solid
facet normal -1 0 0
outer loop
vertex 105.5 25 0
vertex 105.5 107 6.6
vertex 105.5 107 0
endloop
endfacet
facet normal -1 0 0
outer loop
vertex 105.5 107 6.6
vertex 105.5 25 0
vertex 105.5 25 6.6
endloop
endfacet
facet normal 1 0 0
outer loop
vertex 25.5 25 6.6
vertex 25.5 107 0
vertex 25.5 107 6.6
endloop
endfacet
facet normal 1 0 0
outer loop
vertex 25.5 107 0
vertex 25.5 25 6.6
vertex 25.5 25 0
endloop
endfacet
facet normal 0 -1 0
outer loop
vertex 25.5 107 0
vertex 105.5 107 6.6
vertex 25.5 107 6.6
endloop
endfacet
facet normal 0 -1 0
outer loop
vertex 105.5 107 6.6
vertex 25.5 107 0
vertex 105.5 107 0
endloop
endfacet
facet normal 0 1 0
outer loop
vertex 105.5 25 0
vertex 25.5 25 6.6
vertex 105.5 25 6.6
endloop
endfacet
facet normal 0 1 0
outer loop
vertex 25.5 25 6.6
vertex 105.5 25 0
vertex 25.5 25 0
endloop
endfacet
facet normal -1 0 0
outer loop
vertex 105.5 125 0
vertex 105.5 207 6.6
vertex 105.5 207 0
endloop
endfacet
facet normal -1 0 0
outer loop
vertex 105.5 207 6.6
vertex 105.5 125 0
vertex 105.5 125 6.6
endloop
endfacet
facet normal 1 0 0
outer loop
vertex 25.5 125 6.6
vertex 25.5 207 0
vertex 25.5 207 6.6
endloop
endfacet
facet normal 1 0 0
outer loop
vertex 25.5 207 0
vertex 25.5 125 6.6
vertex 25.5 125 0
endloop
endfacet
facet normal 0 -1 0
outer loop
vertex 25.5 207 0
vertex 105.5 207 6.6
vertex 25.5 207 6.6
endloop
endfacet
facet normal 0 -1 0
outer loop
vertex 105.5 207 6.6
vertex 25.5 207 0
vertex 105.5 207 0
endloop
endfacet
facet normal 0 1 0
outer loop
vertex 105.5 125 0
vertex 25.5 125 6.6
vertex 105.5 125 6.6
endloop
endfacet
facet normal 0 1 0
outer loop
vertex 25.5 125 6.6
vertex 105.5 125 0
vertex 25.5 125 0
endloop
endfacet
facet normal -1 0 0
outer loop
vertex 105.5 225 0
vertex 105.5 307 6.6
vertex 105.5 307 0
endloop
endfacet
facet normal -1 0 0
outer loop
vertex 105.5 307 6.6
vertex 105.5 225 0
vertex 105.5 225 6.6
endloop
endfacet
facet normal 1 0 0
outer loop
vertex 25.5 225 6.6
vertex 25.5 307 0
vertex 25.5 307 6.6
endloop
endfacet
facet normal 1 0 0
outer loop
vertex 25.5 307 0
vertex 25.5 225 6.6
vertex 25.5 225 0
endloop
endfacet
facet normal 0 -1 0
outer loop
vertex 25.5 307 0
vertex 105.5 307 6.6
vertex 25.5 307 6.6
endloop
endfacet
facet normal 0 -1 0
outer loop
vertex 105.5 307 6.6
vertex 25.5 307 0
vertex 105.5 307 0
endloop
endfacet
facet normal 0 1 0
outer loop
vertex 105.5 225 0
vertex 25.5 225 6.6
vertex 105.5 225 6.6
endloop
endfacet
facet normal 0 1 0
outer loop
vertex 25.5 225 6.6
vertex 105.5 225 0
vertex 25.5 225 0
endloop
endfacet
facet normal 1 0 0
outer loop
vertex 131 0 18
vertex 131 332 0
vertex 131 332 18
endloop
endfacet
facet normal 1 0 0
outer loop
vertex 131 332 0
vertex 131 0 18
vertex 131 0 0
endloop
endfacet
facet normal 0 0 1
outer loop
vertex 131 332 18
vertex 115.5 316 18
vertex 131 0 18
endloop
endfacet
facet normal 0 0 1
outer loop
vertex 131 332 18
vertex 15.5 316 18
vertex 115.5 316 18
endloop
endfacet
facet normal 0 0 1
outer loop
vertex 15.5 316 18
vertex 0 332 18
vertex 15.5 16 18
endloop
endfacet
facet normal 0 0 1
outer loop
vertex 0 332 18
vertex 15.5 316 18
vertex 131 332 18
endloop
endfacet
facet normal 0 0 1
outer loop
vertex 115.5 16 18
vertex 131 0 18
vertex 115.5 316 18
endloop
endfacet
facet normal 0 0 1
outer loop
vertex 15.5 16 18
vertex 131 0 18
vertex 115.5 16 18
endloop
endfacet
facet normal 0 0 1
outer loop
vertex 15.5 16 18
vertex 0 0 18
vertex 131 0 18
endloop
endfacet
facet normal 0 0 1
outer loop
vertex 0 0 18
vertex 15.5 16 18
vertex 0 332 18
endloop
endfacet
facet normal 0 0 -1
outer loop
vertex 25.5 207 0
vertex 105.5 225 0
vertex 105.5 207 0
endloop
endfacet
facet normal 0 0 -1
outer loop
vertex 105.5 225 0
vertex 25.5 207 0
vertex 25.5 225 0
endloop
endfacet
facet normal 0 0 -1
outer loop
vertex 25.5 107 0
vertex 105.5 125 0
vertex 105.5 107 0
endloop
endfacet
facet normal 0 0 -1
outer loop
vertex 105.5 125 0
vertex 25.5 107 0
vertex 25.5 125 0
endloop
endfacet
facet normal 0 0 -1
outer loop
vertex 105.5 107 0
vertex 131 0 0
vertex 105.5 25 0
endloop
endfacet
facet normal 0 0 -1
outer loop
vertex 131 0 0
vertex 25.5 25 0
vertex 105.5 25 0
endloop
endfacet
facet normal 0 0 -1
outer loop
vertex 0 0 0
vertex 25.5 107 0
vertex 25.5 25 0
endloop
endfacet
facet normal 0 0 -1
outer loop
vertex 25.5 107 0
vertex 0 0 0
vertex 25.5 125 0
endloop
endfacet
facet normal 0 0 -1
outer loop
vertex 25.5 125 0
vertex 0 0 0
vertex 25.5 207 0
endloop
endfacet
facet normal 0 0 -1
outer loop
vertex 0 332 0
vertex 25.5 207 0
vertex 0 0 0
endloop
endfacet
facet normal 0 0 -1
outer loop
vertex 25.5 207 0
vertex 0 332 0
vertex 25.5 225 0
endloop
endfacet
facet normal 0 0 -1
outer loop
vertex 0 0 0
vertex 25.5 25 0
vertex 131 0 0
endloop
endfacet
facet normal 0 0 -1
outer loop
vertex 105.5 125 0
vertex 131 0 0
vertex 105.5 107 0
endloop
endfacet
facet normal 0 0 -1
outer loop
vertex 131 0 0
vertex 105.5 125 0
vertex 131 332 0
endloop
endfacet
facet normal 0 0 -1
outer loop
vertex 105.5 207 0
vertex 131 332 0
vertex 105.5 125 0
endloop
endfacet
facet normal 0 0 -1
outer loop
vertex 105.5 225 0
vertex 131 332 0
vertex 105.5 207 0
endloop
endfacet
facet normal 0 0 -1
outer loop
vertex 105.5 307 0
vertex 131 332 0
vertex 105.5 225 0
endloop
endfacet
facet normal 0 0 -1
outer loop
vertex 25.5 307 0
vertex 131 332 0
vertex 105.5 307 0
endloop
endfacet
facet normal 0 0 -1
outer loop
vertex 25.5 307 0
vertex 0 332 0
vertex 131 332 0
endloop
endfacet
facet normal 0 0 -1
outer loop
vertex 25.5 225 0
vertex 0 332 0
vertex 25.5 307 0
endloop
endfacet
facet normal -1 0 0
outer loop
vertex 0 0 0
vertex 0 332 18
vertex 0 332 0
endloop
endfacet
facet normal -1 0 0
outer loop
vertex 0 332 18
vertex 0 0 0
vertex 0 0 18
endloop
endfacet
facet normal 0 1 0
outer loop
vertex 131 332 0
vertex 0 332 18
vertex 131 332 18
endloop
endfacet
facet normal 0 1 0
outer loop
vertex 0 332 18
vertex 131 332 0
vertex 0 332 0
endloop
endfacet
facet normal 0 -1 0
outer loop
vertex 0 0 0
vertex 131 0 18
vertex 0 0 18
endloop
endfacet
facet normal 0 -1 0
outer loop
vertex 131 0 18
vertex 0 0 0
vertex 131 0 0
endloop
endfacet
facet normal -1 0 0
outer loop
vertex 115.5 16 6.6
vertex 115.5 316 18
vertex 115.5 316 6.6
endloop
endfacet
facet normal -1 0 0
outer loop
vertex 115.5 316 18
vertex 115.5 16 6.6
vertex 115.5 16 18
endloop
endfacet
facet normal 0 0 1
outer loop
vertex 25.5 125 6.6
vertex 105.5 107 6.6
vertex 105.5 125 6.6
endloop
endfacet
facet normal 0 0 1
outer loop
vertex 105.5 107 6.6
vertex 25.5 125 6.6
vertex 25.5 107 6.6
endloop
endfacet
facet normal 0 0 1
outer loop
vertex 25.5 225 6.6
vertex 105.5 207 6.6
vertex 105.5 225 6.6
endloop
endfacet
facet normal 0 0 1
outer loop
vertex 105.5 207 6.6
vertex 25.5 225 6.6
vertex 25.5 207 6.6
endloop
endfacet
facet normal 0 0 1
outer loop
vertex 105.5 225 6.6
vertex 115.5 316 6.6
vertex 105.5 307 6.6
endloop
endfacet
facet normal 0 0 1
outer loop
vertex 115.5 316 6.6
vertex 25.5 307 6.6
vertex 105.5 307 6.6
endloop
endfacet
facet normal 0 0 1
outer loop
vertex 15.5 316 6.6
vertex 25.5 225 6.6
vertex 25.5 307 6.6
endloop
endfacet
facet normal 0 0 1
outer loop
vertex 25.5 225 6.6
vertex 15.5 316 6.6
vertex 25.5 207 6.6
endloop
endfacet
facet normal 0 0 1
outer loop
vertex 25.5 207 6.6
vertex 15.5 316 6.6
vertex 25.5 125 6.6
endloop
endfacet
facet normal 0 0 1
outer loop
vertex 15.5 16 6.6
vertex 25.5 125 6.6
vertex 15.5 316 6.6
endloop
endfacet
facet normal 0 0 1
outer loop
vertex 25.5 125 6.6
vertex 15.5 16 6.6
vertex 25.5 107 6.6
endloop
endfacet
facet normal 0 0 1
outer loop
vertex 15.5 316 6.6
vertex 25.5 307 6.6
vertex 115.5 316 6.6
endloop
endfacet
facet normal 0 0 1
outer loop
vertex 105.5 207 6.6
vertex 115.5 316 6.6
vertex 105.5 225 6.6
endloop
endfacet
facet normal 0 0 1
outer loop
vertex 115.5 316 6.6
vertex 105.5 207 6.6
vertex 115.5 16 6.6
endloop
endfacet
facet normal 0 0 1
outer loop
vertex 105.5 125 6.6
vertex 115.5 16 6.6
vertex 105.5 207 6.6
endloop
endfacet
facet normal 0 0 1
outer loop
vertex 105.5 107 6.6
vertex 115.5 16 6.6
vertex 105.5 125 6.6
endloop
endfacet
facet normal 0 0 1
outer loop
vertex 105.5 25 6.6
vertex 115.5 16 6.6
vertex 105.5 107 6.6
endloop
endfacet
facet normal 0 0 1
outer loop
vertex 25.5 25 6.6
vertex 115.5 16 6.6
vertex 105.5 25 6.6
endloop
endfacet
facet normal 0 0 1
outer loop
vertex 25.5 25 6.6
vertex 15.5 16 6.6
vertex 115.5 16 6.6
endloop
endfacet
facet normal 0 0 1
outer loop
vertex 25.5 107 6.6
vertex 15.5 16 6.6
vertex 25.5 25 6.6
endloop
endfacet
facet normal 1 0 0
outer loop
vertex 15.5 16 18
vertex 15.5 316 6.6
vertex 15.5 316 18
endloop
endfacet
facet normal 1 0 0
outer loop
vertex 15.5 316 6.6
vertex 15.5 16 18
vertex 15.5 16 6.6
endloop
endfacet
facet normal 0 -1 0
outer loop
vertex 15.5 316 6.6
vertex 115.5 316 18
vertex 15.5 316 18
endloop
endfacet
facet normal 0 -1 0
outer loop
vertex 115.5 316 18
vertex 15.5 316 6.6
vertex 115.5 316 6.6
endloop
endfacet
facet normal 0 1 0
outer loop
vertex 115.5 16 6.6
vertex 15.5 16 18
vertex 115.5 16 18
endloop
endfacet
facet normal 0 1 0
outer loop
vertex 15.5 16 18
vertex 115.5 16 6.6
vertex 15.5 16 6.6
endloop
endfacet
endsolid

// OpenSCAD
// Unterputzgehäuse
up_innen_breite = 100;
up_innen_tiefe = 300;
up_innen_hoehe = 47;
up_aussen_breite = 117;
up_aussen_tiefe = 318;
up_aussen_hoehe = 52;

// Rahmen
r_innen_breite = 100;
r_innen_tiefe = 300;
r_innen_hoehe = 11.5;
r2_innen_hoehe = 13.5;
r_aussen_breite = 131;
r_aussen_tiefe = 332;
r_aussen_hoehe = 18;

// Module
m_breite = 99;
m_tiefe = 99;
m_hoehe = 11;


// Rahmen
module rahmen(aussen_breite, aussen_tiefe, aussen_hoehe, innen_breite, innen_tiefe, innen_hoehe) {
    aus_breite = 80;
    aus_tiefe = 82;
    steg = 18;
    aus_diff = (aussen_tiefe - 3*aus_tiefe - 2*steg)/2;
    difference() {
        cube([aussen_breite, aussen_tiefe, aussen_hoehe]);
        translate([(aussen_breite-innen_breite)/2,
            (aussen_tiefe-innen_tiefe)/2,
            aussen_hoehe-innen_hoehe+.1])
        cube([innen_breite, innen_tiefe, innen_hoehe]);
        for(i=[0:2]) {
            translate([(aussen_breite-aus_breite)/2,aus_diff+i*(aus_tiefe+steg),-1])
            cube([aus_breite, aus_tiefe, 10]);
        }
    }
}


rahmen(r_aussen_breite, r_aussen_tiefe, r_aussen_hoehe, r_innen_breite, r_innen_tiefe, r_innen_hoehe);
